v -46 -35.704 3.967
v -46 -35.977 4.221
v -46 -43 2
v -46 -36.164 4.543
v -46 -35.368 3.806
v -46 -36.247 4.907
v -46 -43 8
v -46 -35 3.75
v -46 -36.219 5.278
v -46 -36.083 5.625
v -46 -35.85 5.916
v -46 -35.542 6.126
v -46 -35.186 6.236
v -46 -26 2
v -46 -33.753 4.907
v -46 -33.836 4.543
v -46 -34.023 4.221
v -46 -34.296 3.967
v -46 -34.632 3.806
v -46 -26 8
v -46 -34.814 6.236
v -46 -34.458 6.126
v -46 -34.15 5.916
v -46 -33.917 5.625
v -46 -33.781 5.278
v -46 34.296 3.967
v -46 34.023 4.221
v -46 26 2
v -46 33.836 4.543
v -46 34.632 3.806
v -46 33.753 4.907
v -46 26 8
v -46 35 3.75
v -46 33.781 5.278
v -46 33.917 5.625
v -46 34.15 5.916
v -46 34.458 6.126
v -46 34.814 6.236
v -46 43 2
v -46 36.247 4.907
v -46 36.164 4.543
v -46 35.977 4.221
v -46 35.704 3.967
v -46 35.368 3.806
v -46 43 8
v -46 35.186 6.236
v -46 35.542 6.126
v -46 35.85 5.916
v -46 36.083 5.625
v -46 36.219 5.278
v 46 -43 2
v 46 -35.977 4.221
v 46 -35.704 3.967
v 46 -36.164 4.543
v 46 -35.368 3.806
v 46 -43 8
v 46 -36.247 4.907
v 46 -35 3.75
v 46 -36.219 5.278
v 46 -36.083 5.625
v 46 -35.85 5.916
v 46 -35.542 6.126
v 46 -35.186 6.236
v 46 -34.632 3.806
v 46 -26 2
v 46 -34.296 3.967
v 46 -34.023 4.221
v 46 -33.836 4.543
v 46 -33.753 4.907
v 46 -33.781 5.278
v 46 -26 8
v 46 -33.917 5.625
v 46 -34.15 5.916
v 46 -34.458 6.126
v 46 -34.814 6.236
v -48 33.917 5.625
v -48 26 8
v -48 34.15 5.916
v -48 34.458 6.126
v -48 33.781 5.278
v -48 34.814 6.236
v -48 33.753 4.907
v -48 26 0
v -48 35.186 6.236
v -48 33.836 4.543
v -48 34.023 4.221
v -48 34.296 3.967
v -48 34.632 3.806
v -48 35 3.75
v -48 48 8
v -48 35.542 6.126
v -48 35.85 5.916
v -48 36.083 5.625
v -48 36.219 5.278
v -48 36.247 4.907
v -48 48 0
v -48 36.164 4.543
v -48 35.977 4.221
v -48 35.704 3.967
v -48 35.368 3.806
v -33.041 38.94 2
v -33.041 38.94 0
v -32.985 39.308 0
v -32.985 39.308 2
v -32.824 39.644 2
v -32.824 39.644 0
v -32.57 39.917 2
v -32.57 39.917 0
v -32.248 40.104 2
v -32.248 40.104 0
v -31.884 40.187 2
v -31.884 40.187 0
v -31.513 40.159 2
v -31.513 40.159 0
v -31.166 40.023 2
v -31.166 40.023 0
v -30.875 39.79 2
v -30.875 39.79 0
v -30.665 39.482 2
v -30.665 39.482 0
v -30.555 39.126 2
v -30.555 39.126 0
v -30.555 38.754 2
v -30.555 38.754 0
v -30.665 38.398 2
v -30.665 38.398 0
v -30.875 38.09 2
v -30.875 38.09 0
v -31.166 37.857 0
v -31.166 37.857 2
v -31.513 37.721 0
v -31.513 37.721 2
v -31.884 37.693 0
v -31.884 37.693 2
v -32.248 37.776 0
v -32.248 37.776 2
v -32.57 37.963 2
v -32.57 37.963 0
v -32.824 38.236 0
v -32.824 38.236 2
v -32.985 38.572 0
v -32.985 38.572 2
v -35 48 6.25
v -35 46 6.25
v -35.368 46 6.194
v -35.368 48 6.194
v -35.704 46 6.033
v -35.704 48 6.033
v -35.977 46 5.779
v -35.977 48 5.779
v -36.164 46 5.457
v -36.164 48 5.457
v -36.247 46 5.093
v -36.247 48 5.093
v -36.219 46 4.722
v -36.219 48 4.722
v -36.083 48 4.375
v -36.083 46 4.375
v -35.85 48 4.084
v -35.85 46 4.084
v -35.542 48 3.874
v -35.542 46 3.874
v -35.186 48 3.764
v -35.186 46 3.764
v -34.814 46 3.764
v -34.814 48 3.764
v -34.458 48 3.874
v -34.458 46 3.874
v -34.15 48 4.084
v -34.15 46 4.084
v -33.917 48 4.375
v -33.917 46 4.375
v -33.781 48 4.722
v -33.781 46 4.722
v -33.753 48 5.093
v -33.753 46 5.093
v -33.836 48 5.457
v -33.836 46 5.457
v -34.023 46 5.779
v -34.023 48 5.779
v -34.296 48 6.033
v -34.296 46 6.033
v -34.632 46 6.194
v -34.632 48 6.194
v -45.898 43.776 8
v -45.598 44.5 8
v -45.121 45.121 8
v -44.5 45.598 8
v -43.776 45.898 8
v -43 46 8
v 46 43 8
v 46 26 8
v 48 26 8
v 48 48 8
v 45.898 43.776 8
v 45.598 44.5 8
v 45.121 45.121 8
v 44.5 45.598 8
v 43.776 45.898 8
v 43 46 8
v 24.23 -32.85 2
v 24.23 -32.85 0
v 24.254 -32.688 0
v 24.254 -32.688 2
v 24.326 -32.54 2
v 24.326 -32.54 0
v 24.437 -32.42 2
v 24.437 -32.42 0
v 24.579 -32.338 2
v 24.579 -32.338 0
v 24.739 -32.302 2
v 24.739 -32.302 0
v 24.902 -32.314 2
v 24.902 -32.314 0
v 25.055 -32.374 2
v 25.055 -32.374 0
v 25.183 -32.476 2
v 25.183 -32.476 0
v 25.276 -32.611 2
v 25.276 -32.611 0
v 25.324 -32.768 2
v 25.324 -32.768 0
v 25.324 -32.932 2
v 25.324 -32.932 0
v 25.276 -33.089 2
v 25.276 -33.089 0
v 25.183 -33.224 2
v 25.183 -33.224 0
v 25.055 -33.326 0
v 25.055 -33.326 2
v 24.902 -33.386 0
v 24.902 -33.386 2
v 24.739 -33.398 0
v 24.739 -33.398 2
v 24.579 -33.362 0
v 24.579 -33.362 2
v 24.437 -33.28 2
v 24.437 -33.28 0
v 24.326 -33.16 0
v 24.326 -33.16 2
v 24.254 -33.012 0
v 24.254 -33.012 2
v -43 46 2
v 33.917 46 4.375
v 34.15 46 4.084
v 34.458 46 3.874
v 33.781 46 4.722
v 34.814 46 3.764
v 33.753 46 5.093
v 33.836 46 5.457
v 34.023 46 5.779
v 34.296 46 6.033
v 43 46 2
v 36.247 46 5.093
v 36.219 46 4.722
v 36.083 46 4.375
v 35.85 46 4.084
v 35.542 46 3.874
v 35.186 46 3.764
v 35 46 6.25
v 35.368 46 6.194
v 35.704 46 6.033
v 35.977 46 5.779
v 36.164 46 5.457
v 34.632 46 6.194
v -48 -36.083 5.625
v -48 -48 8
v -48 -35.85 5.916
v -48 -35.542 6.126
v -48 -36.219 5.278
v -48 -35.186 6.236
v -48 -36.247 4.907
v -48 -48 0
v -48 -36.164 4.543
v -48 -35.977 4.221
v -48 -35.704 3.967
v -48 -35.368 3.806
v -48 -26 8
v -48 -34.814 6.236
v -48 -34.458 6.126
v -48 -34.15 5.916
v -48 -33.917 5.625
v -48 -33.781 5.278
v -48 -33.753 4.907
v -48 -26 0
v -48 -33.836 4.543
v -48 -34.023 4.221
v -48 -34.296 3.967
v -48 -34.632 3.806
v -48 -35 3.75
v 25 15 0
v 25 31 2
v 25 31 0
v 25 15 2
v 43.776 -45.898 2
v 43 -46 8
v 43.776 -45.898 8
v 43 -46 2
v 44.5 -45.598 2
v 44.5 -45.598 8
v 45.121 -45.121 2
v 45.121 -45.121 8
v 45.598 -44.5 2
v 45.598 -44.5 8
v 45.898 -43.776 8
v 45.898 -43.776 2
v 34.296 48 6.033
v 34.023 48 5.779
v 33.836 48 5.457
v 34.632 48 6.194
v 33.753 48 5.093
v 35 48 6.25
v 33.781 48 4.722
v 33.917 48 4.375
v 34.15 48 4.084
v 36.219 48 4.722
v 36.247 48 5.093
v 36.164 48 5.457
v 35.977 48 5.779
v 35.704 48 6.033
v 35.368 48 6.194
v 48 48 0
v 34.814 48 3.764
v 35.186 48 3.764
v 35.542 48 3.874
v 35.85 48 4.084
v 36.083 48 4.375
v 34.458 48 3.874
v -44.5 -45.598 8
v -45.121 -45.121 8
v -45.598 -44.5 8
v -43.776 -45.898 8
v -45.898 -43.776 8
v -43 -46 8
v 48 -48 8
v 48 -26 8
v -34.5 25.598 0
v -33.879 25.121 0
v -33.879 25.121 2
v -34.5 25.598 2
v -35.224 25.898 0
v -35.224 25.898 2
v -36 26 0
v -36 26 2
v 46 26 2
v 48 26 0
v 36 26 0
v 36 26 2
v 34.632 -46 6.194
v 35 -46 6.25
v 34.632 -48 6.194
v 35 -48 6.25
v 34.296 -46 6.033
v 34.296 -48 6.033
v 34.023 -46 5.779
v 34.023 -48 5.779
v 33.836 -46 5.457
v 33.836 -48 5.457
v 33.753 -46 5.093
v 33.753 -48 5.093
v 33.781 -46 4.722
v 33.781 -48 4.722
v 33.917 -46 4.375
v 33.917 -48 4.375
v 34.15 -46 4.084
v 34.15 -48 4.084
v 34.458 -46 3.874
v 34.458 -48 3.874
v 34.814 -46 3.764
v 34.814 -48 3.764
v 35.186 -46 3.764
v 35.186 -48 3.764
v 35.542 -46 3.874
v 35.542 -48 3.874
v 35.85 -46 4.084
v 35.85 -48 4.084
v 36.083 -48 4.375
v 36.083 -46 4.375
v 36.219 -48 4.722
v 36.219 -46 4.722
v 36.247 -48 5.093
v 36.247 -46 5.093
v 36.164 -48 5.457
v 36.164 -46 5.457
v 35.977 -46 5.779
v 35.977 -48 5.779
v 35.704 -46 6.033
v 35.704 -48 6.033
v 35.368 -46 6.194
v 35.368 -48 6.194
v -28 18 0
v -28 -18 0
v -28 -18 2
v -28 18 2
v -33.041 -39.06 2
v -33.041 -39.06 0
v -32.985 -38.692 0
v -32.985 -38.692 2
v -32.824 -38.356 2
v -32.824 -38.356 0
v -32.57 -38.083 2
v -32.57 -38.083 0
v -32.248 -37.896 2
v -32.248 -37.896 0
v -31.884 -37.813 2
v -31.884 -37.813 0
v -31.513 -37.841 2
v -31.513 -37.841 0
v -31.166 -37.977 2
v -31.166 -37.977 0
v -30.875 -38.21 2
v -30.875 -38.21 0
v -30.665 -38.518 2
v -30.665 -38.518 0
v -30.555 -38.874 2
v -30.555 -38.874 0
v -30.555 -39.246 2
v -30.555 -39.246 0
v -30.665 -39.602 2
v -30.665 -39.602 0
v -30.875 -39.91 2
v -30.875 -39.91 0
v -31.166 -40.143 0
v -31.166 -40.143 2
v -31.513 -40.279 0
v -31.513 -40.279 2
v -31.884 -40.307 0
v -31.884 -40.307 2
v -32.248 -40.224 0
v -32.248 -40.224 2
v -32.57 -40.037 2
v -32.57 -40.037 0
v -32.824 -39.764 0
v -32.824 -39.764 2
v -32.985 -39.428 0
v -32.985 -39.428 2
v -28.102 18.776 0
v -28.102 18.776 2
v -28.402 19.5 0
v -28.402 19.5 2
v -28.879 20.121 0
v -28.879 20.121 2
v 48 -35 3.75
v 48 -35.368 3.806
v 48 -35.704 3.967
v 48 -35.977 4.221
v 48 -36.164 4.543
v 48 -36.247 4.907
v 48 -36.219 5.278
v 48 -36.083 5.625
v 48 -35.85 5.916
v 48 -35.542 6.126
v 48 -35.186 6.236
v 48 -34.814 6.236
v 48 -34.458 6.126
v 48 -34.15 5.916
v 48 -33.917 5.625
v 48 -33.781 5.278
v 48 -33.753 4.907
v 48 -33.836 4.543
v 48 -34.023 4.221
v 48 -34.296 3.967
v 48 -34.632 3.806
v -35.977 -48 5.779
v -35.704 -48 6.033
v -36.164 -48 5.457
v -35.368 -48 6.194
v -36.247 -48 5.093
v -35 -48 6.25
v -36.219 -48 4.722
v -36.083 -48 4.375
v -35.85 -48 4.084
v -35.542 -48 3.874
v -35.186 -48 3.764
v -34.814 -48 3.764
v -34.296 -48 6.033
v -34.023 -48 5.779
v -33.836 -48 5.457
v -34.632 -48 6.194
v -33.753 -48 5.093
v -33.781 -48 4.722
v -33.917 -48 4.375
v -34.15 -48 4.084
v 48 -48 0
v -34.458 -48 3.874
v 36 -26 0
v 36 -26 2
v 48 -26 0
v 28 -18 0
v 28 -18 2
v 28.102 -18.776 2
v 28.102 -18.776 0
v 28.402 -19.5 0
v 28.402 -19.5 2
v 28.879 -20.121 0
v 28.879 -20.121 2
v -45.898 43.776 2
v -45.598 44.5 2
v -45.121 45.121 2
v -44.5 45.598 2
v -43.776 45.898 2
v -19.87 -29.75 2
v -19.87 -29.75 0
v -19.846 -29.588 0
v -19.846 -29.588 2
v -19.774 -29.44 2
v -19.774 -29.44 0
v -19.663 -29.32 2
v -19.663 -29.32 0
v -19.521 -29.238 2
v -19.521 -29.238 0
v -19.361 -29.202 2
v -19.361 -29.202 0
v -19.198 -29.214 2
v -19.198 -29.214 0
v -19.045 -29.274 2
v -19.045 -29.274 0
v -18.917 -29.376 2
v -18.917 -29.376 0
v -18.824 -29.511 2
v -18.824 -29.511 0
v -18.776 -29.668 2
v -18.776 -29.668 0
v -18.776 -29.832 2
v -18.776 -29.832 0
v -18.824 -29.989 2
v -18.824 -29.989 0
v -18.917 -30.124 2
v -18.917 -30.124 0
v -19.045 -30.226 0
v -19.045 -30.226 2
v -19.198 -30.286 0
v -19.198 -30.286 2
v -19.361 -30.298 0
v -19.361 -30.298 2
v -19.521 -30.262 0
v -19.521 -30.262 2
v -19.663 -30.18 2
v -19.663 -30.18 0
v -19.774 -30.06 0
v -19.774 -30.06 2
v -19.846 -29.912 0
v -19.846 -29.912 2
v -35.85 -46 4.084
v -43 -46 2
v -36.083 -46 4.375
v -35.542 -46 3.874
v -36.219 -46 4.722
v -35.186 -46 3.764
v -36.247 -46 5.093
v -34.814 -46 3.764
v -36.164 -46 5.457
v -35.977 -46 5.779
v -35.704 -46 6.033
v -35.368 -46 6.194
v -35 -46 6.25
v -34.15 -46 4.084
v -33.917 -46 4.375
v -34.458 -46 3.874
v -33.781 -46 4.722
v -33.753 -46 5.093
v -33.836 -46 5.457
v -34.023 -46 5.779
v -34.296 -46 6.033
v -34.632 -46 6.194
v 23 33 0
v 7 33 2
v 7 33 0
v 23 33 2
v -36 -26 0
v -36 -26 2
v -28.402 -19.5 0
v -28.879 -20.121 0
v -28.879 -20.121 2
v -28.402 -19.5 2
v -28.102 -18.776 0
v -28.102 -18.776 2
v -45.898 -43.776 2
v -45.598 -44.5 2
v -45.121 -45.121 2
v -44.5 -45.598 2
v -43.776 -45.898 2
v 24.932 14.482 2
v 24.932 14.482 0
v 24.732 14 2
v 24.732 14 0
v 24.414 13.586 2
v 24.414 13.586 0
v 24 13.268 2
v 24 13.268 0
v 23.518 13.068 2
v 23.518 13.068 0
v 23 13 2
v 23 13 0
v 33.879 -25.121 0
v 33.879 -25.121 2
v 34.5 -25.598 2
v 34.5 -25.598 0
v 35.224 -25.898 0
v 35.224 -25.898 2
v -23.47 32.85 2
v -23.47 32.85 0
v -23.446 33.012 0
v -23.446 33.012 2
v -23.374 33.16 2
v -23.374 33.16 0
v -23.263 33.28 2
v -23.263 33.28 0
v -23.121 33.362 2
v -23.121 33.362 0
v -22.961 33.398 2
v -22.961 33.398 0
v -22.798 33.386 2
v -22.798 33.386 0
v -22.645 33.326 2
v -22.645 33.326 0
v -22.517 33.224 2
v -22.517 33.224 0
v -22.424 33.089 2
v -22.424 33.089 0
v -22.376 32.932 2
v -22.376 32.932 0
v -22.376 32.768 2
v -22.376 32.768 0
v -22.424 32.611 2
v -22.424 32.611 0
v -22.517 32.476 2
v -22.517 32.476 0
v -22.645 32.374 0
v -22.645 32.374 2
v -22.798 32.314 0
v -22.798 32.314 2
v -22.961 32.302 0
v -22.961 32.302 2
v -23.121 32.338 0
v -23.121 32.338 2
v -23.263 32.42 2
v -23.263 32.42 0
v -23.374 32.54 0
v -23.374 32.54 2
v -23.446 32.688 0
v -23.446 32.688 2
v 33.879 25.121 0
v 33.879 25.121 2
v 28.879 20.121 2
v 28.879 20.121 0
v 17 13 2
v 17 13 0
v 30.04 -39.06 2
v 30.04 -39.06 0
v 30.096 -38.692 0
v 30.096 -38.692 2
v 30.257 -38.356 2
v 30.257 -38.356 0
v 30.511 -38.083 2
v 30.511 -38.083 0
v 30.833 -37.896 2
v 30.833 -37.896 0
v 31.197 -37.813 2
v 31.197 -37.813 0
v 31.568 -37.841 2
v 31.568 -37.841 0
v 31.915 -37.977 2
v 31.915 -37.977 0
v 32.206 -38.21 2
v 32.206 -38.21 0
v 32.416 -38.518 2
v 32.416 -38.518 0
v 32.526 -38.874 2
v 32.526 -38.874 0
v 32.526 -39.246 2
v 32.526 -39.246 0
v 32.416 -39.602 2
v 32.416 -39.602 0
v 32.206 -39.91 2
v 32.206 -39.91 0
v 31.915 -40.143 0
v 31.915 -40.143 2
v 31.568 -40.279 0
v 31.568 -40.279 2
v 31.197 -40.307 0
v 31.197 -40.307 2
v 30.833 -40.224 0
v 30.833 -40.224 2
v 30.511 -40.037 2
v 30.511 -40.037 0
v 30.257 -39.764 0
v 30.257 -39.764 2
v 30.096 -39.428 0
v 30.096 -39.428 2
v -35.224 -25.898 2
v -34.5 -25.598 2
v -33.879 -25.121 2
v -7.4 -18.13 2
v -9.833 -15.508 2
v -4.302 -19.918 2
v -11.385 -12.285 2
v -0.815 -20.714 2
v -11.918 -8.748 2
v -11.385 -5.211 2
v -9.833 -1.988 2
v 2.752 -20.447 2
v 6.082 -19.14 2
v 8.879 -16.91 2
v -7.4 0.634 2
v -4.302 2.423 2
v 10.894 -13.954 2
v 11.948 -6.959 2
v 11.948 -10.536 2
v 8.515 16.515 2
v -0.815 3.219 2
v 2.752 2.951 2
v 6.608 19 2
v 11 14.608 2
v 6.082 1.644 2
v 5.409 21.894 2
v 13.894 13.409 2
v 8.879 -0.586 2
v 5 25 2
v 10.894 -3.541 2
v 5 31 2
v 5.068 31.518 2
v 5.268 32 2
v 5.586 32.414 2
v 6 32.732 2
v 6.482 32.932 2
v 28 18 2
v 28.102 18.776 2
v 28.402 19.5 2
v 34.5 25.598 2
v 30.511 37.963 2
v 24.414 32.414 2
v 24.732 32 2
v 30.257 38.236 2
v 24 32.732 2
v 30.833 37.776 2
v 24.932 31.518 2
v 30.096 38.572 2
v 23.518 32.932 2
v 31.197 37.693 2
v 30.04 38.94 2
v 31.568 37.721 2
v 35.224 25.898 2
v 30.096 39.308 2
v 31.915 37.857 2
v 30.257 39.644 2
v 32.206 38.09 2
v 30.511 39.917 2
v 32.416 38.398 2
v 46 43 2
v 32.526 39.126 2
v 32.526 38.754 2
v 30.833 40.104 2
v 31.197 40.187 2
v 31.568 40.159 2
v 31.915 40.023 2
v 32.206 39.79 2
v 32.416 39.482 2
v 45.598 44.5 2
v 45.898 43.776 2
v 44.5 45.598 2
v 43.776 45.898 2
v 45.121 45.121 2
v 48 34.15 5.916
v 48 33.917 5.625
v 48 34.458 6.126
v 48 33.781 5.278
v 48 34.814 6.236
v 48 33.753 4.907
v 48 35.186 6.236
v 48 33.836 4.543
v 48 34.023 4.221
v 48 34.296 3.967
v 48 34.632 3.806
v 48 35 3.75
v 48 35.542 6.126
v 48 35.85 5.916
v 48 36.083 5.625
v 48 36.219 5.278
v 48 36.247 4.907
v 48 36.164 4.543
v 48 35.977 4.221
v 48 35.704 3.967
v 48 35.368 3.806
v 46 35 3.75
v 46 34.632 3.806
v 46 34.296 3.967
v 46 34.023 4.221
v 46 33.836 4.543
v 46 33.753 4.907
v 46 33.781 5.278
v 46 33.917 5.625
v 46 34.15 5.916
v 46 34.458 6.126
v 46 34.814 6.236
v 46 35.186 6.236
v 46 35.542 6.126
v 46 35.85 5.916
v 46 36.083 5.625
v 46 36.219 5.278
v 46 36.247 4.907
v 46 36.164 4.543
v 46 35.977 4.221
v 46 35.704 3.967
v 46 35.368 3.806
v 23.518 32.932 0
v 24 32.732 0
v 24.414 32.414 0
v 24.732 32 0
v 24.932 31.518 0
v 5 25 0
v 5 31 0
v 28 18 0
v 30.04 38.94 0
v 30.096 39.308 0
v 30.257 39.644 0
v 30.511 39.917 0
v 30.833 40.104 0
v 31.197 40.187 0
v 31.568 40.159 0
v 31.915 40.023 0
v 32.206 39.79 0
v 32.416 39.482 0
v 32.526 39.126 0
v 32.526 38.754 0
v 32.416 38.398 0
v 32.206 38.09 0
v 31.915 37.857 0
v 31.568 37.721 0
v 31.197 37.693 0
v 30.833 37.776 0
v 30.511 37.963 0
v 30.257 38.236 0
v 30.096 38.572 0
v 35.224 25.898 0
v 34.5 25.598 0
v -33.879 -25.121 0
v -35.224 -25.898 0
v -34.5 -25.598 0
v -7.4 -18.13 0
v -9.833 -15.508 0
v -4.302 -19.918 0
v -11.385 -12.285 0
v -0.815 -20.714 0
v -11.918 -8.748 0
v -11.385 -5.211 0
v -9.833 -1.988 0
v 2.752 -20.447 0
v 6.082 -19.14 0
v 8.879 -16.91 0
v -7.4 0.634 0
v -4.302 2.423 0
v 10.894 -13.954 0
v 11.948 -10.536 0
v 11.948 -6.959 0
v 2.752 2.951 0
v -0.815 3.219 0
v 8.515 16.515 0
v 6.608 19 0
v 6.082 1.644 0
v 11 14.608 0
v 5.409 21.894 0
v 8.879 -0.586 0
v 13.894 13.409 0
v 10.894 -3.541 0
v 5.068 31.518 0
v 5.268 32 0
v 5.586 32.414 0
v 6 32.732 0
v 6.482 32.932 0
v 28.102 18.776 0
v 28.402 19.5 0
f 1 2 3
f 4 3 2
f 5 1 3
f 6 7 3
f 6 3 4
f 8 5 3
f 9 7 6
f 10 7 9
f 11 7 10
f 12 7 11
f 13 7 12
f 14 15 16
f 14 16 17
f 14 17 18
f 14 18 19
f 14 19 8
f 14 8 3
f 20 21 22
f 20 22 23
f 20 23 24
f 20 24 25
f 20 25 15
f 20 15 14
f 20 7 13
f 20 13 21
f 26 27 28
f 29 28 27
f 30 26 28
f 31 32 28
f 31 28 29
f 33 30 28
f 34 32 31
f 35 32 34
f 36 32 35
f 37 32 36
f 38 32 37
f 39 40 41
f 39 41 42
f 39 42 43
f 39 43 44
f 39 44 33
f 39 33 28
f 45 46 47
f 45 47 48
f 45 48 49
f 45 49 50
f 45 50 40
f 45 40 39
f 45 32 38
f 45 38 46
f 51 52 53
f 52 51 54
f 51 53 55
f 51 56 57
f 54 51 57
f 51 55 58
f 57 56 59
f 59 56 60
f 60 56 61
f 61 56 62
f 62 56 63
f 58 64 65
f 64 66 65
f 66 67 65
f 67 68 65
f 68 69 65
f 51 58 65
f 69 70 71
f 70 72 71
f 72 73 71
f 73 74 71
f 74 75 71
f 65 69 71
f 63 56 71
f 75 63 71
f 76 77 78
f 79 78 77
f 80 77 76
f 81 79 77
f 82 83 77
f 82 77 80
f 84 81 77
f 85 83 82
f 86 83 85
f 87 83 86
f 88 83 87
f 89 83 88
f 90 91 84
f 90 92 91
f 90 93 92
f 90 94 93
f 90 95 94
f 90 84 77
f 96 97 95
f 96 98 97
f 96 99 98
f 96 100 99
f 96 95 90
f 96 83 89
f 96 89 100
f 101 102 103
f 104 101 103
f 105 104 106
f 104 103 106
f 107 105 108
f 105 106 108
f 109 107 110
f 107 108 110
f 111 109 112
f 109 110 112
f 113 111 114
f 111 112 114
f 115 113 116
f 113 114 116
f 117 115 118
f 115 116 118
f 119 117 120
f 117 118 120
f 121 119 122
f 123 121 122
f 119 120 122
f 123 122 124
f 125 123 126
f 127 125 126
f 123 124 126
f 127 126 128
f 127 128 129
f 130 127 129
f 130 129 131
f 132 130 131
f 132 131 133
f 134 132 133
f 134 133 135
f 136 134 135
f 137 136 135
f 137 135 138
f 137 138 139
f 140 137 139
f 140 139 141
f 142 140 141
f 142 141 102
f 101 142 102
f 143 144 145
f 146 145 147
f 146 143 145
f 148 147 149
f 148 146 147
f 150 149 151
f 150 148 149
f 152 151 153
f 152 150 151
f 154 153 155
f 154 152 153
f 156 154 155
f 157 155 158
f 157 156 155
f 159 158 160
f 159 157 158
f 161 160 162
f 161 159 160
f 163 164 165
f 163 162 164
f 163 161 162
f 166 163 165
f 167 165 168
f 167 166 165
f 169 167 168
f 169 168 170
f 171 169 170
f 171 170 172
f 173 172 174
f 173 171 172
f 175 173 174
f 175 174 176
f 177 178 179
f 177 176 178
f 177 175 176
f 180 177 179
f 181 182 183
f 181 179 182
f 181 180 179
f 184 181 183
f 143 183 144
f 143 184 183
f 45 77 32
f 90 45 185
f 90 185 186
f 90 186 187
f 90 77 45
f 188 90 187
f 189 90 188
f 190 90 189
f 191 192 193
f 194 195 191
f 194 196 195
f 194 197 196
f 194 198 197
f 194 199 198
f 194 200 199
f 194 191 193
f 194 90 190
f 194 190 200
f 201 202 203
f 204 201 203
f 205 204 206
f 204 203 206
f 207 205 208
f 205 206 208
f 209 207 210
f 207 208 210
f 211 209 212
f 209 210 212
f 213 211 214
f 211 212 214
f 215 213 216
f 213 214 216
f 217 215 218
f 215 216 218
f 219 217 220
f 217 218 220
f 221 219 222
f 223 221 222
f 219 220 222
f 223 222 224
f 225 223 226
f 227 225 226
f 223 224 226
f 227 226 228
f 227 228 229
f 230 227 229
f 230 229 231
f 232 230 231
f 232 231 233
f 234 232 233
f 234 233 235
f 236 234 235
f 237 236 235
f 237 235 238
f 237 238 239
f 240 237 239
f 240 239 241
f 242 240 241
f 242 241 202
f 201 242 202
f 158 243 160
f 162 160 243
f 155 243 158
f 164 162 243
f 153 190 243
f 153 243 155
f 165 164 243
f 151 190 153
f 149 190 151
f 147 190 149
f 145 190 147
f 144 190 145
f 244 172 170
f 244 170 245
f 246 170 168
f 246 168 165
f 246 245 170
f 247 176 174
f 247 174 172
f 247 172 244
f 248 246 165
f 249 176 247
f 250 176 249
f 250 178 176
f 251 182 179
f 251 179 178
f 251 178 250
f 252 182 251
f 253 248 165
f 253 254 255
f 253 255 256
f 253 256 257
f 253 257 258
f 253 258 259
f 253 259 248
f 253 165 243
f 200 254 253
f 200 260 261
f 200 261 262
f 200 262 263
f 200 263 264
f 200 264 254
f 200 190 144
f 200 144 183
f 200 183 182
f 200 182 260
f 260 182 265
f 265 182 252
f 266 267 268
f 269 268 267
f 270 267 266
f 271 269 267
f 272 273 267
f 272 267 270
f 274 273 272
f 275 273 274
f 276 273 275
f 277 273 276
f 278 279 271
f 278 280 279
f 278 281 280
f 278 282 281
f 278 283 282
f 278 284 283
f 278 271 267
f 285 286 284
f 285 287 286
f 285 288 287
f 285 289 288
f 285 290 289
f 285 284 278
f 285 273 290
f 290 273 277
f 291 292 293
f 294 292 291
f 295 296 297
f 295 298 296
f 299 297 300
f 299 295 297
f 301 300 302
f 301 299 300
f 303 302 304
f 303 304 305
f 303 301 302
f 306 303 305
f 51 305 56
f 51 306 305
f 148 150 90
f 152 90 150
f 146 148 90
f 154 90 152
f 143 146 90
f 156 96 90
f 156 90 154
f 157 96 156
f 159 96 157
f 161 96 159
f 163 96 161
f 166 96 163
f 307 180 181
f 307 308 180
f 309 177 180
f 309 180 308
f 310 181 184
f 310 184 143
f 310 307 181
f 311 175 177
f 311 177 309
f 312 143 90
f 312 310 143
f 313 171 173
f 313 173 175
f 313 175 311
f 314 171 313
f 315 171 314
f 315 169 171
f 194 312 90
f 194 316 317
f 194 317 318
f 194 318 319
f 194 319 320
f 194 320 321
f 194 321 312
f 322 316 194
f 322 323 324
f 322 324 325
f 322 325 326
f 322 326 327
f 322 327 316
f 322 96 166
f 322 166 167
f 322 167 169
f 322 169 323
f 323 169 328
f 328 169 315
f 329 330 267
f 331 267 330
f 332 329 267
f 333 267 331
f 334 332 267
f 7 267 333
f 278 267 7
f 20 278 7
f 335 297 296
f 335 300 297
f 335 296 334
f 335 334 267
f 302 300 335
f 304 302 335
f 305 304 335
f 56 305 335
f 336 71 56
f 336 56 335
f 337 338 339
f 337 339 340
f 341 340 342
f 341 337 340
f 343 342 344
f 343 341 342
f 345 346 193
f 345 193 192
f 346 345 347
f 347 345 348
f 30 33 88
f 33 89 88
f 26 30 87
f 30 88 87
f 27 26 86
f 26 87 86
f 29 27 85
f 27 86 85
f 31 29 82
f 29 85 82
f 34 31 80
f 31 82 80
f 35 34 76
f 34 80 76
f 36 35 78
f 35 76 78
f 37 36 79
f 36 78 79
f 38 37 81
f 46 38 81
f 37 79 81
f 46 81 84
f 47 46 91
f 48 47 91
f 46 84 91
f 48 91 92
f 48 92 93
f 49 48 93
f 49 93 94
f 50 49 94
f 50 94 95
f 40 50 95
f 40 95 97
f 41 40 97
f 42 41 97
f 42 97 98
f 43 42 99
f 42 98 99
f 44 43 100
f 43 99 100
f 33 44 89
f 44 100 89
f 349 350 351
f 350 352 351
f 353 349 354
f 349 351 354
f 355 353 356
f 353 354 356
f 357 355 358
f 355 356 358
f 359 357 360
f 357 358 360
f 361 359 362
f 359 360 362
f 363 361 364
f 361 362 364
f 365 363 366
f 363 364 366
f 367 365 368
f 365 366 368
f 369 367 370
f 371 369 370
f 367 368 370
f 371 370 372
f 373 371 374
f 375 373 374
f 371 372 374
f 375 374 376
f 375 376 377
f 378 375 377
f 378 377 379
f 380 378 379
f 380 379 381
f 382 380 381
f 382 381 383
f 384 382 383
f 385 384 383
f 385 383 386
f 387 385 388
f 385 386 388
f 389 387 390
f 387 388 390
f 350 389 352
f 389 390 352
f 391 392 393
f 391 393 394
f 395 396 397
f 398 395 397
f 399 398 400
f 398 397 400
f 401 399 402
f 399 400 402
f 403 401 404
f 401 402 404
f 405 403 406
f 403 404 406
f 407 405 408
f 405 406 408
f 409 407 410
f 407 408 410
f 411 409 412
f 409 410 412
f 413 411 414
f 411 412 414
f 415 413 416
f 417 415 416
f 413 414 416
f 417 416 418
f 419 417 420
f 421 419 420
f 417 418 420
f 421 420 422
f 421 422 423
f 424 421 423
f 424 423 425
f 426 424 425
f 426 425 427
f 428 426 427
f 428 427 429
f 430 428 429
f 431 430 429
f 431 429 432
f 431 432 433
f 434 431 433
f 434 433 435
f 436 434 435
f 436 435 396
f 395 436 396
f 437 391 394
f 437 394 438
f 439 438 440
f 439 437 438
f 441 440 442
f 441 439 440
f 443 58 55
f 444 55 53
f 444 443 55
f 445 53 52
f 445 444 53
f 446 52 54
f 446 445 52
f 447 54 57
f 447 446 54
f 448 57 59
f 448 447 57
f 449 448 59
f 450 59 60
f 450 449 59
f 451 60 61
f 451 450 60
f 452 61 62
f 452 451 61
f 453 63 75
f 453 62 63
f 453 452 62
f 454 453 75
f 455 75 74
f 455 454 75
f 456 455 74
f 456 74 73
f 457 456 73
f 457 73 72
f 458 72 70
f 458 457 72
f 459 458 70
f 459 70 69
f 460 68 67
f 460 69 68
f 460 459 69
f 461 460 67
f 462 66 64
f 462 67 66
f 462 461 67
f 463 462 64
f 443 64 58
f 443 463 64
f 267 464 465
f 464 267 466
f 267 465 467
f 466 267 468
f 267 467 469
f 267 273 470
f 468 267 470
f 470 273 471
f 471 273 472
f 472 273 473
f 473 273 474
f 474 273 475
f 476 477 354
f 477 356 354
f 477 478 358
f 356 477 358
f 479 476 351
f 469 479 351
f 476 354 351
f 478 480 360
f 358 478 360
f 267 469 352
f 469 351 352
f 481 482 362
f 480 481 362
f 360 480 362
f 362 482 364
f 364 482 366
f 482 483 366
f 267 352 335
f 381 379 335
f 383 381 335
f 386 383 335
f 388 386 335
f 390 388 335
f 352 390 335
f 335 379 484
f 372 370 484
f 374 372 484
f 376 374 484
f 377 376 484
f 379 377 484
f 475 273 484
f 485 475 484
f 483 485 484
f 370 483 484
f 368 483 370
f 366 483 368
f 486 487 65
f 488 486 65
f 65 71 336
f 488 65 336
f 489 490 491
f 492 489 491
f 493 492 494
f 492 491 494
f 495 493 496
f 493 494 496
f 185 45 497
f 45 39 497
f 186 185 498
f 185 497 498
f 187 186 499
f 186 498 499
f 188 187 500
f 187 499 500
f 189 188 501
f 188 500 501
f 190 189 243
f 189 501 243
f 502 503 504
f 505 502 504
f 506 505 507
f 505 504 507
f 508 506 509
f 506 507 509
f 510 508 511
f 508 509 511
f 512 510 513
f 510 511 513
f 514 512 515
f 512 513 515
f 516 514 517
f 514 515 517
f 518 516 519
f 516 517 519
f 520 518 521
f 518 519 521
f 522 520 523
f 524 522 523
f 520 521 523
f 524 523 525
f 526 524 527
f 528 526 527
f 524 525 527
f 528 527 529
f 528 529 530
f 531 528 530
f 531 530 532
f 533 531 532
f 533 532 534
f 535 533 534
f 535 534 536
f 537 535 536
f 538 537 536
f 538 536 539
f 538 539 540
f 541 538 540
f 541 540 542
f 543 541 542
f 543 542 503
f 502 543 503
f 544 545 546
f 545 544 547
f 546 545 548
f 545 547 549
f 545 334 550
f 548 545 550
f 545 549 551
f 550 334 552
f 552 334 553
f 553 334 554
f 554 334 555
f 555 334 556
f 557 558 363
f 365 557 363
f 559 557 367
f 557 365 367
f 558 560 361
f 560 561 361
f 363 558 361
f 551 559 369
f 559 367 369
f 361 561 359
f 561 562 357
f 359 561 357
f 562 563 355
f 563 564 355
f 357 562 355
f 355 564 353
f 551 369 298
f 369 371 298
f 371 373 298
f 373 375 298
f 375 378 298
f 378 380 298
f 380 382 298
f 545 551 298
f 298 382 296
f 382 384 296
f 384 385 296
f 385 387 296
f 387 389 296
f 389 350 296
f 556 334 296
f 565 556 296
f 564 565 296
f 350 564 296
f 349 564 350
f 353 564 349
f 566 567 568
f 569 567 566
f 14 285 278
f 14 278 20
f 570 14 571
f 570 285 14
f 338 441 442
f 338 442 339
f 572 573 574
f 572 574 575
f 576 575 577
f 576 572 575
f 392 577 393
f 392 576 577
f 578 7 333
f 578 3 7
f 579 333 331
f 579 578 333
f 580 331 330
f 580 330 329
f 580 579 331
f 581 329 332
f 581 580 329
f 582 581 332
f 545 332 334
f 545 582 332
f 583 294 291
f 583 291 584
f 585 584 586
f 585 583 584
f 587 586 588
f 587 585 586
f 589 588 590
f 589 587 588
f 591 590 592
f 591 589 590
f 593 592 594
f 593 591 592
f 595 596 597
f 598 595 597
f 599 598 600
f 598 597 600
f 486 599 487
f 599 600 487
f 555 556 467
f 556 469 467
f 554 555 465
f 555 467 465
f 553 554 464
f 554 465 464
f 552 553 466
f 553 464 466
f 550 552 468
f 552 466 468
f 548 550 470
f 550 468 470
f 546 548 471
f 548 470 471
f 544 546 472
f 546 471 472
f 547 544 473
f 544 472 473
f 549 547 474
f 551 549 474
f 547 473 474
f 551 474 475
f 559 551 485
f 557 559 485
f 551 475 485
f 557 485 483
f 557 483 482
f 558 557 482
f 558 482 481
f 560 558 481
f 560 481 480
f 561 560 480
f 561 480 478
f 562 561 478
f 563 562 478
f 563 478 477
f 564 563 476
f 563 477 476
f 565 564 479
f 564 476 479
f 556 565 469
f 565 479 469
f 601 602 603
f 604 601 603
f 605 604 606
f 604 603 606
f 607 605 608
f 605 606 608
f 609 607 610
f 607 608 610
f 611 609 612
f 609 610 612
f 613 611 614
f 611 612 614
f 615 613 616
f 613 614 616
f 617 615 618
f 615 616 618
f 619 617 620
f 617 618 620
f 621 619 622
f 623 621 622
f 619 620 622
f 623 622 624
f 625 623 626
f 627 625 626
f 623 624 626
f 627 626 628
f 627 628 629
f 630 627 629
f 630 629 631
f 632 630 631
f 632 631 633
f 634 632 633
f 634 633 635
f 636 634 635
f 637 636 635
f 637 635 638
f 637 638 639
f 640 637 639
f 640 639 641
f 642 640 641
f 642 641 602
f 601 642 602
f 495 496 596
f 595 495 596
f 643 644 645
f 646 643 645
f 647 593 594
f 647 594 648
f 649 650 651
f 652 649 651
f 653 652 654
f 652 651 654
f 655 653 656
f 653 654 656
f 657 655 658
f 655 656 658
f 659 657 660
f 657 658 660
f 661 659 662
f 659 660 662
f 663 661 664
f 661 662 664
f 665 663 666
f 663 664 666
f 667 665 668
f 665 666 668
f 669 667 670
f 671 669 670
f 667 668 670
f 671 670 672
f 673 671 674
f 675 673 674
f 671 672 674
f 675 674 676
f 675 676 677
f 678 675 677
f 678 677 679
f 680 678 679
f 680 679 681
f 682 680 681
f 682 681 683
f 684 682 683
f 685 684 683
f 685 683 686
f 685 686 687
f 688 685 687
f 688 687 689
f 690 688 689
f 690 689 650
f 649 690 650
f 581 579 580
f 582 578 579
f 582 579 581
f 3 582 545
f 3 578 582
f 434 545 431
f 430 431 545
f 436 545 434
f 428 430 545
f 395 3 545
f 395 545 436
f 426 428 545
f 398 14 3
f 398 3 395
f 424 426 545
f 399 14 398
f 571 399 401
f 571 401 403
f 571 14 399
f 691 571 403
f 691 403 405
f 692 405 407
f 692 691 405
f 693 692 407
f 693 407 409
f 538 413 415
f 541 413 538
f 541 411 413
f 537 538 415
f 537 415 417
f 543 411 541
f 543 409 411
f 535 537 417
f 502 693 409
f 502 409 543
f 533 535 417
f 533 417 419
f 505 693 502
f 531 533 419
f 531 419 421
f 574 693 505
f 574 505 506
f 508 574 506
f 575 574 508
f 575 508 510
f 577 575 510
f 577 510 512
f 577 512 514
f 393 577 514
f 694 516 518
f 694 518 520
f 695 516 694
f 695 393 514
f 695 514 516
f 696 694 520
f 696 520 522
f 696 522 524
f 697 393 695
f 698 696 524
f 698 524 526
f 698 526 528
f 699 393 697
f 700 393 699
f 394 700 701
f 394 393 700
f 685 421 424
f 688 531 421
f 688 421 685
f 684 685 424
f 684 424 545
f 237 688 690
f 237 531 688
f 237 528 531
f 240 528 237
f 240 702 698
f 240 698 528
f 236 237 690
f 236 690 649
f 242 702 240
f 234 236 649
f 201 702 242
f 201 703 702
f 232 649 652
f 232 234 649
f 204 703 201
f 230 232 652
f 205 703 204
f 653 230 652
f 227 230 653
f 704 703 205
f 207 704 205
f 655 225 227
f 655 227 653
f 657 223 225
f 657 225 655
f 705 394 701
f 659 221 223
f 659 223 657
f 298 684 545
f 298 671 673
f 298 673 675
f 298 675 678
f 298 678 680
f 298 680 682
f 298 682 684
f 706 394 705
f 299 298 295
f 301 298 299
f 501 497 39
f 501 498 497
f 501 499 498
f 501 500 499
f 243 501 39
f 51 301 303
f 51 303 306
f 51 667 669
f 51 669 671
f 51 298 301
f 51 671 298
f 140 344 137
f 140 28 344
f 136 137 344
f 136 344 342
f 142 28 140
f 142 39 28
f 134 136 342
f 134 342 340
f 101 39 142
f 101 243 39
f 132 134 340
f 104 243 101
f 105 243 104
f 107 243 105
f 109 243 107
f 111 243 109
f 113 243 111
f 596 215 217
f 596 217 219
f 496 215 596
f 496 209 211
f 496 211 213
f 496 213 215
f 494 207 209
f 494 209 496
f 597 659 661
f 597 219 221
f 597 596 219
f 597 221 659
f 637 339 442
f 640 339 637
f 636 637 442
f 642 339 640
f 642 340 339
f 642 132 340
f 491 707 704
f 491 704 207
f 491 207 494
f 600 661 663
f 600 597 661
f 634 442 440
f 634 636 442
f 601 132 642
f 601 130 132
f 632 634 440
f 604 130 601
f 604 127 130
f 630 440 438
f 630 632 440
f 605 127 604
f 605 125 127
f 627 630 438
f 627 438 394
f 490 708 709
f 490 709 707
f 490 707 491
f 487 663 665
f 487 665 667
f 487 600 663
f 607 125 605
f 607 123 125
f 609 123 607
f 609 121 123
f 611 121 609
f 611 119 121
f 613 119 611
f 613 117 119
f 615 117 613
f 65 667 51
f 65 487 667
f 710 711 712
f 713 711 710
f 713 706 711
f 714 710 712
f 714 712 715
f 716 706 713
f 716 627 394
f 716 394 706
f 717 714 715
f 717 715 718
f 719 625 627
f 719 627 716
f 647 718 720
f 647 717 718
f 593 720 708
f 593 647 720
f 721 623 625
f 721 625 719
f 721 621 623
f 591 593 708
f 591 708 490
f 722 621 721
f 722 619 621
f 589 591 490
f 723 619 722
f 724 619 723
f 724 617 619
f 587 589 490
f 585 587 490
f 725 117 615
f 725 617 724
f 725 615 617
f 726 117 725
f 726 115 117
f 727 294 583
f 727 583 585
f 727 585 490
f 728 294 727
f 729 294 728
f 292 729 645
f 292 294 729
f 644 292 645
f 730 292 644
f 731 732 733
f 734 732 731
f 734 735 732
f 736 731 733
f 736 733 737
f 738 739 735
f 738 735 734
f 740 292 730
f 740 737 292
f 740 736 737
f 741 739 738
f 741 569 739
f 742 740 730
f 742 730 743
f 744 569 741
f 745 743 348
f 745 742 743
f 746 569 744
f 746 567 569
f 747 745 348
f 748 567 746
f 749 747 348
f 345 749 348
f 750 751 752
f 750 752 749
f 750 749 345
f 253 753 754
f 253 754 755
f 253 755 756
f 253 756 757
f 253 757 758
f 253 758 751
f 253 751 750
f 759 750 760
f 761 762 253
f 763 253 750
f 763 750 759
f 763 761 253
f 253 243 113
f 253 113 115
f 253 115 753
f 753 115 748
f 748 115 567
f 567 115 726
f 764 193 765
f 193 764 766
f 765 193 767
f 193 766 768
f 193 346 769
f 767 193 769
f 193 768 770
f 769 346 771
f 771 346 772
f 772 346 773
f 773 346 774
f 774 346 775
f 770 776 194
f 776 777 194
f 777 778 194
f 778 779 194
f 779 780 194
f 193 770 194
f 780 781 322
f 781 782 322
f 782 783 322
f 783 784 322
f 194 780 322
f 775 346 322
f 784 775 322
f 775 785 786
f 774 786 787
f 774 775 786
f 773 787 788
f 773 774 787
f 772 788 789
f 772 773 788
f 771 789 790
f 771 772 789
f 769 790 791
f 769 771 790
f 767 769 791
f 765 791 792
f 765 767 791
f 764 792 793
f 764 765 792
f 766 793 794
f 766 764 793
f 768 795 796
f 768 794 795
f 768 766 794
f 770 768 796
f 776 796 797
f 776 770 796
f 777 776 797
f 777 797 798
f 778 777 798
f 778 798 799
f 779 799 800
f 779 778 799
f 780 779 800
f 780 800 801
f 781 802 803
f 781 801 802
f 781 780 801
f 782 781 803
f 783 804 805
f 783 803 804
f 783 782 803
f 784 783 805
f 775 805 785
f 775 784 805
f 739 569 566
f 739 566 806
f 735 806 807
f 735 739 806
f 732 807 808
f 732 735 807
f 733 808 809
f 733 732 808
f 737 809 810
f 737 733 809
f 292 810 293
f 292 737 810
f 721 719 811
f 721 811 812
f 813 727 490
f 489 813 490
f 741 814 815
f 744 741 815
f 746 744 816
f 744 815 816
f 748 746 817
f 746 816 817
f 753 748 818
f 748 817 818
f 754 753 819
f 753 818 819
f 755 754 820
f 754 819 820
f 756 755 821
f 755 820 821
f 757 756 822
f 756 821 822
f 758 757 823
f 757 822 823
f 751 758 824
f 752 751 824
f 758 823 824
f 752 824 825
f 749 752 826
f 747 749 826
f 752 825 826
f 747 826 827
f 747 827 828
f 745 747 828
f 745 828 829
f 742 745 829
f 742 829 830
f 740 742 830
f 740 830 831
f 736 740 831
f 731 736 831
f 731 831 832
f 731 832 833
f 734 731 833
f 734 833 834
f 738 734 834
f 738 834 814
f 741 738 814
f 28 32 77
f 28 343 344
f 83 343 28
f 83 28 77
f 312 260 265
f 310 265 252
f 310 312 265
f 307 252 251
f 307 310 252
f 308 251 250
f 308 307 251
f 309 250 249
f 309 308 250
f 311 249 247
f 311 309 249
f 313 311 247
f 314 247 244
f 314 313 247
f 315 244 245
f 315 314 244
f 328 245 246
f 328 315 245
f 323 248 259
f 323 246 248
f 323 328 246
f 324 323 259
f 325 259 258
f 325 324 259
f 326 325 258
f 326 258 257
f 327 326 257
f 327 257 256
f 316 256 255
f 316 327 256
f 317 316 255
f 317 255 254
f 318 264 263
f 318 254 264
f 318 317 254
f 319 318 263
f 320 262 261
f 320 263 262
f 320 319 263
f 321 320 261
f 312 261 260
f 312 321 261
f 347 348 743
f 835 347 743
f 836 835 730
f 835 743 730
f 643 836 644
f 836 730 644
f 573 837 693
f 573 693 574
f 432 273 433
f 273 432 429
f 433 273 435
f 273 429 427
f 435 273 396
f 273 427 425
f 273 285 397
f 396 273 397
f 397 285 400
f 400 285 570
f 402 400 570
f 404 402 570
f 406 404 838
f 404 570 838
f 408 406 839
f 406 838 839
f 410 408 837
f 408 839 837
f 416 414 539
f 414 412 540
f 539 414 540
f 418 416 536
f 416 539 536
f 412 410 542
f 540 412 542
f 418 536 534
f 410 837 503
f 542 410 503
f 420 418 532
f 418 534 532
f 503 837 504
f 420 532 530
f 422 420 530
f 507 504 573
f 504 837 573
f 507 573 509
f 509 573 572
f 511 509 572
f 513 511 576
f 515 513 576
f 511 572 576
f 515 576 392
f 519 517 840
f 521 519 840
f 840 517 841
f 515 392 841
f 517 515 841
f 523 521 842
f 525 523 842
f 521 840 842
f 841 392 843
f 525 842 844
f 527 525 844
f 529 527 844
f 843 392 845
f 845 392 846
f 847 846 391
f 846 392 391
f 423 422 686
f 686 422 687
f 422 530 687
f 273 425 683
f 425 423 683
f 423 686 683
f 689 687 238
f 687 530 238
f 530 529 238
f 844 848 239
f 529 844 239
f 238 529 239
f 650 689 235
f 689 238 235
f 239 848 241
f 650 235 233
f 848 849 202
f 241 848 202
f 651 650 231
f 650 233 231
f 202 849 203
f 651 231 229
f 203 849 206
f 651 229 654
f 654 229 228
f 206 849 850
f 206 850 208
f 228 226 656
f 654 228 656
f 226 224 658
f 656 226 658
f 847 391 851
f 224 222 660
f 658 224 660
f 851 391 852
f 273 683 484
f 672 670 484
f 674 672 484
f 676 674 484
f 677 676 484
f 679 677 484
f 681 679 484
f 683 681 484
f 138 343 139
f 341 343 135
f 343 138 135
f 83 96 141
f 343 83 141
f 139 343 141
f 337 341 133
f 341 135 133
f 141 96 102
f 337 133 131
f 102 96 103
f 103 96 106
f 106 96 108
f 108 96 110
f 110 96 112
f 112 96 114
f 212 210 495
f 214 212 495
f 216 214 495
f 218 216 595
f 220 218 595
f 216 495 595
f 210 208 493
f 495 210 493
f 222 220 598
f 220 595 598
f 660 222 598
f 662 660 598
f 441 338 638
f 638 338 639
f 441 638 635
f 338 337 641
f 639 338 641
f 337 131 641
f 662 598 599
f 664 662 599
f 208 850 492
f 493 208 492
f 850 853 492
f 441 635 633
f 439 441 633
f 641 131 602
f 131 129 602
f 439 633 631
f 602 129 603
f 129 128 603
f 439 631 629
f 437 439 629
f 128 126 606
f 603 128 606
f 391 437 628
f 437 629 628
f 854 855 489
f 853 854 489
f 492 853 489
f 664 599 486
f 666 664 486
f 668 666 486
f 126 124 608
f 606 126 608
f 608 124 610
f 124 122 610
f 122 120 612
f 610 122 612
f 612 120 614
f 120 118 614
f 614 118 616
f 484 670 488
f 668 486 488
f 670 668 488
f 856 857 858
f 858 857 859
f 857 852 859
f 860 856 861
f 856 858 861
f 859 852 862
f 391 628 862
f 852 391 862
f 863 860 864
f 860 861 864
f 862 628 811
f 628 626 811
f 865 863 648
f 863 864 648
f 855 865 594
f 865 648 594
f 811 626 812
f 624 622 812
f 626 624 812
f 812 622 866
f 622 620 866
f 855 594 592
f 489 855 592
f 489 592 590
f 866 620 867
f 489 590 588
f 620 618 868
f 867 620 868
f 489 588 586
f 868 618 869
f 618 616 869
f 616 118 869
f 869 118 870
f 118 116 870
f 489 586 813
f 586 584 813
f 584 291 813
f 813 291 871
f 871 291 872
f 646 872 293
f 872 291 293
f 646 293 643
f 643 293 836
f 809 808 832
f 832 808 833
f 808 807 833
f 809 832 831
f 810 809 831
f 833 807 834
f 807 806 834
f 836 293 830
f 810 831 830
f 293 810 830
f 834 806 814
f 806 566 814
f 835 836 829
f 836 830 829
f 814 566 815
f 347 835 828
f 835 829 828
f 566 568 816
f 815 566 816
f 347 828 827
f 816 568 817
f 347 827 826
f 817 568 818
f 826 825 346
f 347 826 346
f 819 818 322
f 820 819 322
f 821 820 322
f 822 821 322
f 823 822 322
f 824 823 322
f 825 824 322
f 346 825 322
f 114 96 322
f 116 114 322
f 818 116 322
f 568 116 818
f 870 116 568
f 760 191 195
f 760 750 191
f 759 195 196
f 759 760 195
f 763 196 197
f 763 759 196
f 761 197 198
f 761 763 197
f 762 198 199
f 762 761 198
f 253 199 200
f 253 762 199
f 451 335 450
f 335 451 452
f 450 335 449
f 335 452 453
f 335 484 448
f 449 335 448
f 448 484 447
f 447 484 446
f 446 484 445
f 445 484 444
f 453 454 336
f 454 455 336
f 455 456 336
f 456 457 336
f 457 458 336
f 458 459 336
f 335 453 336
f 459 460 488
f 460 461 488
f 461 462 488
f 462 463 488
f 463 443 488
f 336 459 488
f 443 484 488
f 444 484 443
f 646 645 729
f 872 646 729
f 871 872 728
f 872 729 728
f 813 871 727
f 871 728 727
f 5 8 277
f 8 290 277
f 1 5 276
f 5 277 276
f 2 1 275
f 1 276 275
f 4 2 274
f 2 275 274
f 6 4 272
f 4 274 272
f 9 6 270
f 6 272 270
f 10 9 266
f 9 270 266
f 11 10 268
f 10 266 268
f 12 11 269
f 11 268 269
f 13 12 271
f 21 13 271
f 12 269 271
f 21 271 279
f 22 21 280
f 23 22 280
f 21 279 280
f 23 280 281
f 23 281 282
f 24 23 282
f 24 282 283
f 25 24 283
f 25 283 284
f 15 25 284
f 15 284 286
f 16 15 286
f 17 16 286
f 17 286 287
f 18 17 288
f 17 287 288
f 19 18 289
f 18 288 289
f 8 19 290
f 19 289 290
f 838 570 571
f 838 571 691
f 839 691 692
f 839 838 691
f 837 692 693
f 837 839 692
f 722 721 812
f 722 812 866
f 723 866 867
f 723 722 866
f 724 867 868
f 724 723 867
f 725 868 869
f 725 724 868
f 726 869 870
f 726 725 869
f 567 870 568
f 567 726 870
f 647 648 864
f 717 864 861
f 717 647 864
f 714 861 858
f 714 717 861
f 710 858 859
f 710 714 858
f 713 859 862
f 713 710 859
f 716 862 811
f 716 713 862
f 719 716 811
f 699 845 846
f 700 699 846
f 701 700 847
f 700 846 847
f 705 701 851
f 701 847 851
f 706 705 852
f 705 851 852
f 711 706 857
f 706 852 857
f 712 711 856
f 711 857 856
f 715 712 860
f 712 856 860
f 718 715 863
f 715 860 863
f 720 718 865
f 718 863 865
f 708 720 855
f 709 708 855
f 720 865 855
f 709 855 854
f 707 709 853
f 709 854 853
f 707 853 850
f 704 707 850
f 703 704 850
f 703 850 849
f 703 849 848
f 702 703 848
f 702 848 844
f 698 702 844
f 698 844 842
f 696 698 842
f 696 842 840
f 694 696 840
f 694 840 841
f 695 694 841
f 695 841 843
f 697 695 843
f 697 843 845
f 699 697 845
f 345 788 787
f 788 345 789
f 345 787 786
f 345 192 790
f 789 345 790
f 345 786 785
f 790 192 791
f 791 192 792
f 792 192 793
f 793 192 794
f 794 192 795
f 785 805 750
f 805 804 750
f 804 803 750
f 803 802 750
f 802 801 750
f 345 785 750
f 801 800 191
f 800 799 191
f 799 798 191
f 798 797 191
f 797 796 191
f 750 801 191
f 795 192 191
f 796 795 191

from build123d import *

# Parameters (mm, degrees)
SKETCH1_W                      = 96
SKETCH1_H                      = 96
BOSS_EXTRUDE1_DEPTH            = 8
SKETCH2_W                      = 92
SKETCH2_H                      = 92
COMPONENT_PLATFORM_DEPTH       = 6
CABLE_SLOTS_DEPTH              = 6
INNER_CORNER_FILLETS_R         = 3
M3X0_5_TAPPED_HOLE1_AT_2_COUNT = 2
M3X0_5_TAPPED_HOLE1_AT_2_PITCH = 70
M3X0_5_TAPPED_HOLE2_AT_2_COUNT = 2
M3X0_5_TAPPED_HOLE2_AT_2_PITCH = 70
M1_4X0_3_TAPPED_HOLE1_D        = 1.1
M1_4X0_3_TAPPED_HOLE1_DEPTH    = 3.7
M1_4X0_3_TAPPED_HOLE1_TIP      = 0.33047334
SKETCH29_R                     = 12
HDD_EXTRUSION_CUTOUT_DEPTH     = 10
HDD_EXTRUSION_CUTOUT_2_DEPTH   = 10
M3X0_5_TAPPED_HOLE3_D          = 2.5
M3X0_5_TAPPED_HOLE3_DEPTH      = 10
M3X0_5_TAPPED_HOLE3_TIP        = 0.751075774


with BuildPart() as part:
    # Sketch1 → Boss-Extrude1 (new body)
    with BuildSketch(Plane.XY):
        Rectangle(SKETCH1_W, SKETCH1_H)
    extrude(amount=BOSS_EXTRUDE1_DEPTH)

    # Sketch2 → Component Platform (cut)
    with BuildSketch(Plane.XY.offset(8)):
        Rectangle(SKETCH2_W, SKETCH2_H)
    extrude(amount=-COMPONENT_PLATFORM_DEPTH, mode=Mode.SUBTRACT)

    # Sketch3 → Cable Slots (cut, symmetric)
    with BuildSketch(Plane.XY.offset(2)):
        with BuildLine():
            Line((-33.878679656, -25.121320344), (-28.878679656, -20.121320344))
            ThreePointArc((-28.878679656, -20.121320344), (-28.228361402, -19.148050297), (-28, -18))
            Line((-28, -18), (-28, 18))
            ThreePointArc((-28, 18), (-28.228361402, 19.148050297), (-28.878679656, 20.121320344))
            Line((-28.878679656, 20.121320344), (-33.878679656, 25.121320344))
            ThreePointArc((-33.878679656, 25.121320344), (-34.851949703, 25.771638598), (-36, 26))
            Line((-36, 26), (-48, 26))
            Line((-48, 26), (-48, -26))
            Line((-48, -26), (-36, -26))
            ThreePointArc((-36, -26), (-34.851949703, -25.771638598), (-33.878679656, -25.121320344))
        make_face()
        with BuildLine():
            Line((48, -26), (48, 26))
            Line((48, 26), (36, 26))
            ThreePointArc((36, 26), (34.851949703, 25.771638598), (33.878679656, 25.121320344))
            Line((33.878679656, 25.121320344), (28.878679656, 20.121320344))
            ThreePointArc((28.878679656, 20.121320344), (28.228361402, 19.148050297), (28, 18))
            Line((28, 18), (28, -18))
            ThreePointArc((28, -18), (28.228361402, -19.148050297), (28.878679656, -20.121320344))
            Line((28.878679656, -20.121320344), (33.878679656, -25.121320344))
            ThreePointArc((33.878679656, -25.121320344), (34.851949703, -25.771638598), (36, -26))
            Line((36, -26), (48, -26))
        make_face()
    extrude(amount=CABLE_SLOTS_DEPTH, both=True, mode=Mode.SUBTRACT)

    # Inner Corner Fillets
    inner_corner_fillets_edges = [part.edges().sort_by_distance(p)[0] for p in [
        (-46, -46, 5),
        (-46, 46, 5),
        (46, 46, 5),
        (46, -46, 5),
    ]]
    fillet(inner_corner_fillets_edges, radius=INNER_CORNER_FILLETS_R)

    # Sketch14 → M3x0.5 Tapped Hole1 (revolve, cut)
    with BuildSketch(Plane(origin=(48, -35, 5), x_dir=(0, 0, -1), z_dir=(0, 1, 0))):
        Polygon((0, 0), (0, 10.751075774), (1.25, 10), (1.25, 0), align=None)
    m3x0_5_tapped_hole1 = revolve(axis=Axis((54.35, -35, 5), (-1, 0, 0)), mode=Mode.SUBTRACT)

    # M3x0.5 Tapped Hole1 at 2: M3x0.5 Tapped Hole1 ×2
    with Locations(*[(0, i * M3X0_5_TAPPED_HOLE1_AT_2_PITCH, 0) for i in range(1, M3X0_5_TAPPED_HOLE1_AT_2_COUNT)]):
        add(m3x0_5_tapped_hole1, mode=Mode.SUBTRACT)

    # Sketch16 → M3x0.5 Tapped Hole2 (revolve, cut)
    with BuildSketch(Plane(origin=(35, 48, 5), x_dir=(0, 0, 1), z_dir=(1, 0, 0))):
        Polygon((0, 0), (0, 10.751075774), (1.25, 10), (1.25, 0), align=None)
    m3x0_5_tapped_hole2 = revolve(axis=Axis((35, 54.35, 5), (0, -1, 0)), mode=Mode.SUBTRACT)

    # M3x0.5 Tapped Hole2 at 2: M3x0.5 Tapped Hole2 ×2
    with Locations(*[(-i * M3X0_5_TAPPED_HOLE2_AT_2_PITCH, 0, 0) for i in range(1, M3X0_5_TAPPED_HOLE2_AT_2_COUNT)]):
        add(m3x0_5_tapped_hole2, mode=Mode.SUBTRACT)

    # Mirror1: M3x0.5 Tapped Hole1 across plane
    add(m3x0_5_tapped_hole1.mirror(Plane(origin=(0, 0, 0), x_dir=(0, 0, 1), z_dir=(1, 0, 0))), mode=Mode.SUBTRACT)

    # Mirror1 copy 1 sketch → Mirror1 copy 1 (revolve, cut)
    with BuildSketch(Plane(origin=(-48, 35, 5), x_dir=(0, 0, -1), z_dir=(0, 1, 0))):
        Polygon((0, 0), (0, -10.751075774), (1.25, -10), (1.25, 0), align=None)
    revolve(axis=Axis((-54.35, 35, 5), (-1, 0, 0)), mode=Mode.SUBTRACT)

    # Mirror2: M3x0.5 Tapped Hole2 across plane
    add(m3x0_5_tapped_hole2.mirror(Plane(origin=(0, 0, 0), x_dir=(0, 0, 1), z_dir=(0, -1, 0))), mode=Mode.SUBTRACT)

    # Mirror2 copy 1 sketch → Mirror2 copy 1 (revolve, cut)
    with BuildSketch(Plane(origin=(-35, -48, 5), x_dir=(0, 0, 1), z_dir=(1, 0, 0))):
        Polygon((0, 0), (0, -10.751075774), (1.25, -10), (1.25, 0), align=None)
    revolve(axis=Axis((-35, -54.35, 5), (0, -1, 0)), mode=Mode.SUBTRACT)

    # M1.4x0.3 Tapped Hole1
    with Locations(Plane.XY.offset(2)):
        with Locations((-19.31998517, -29.75), (24.78001483, -32.85), (-22.91998517, 32.85)):
            Hole(M1_4X0_3_TAPPED_HOLE1_D / 2, depth=M1_4X0_3_TAPPED_HOLE1_DEPTH)
            with Locations((0, 0, -(M1_4X0_3_TAPPED_HOLE1_DEPTH + M1_4X0_3_TAPPED_HOLE1_TIP / 2))):  # 118° drill point
                Cone(0, M1_4X0_3_TAPPED_HOLE1_D / 2, M1_4X0_3_TAPPED_HOLE1_TIP, mode=Mode.SUBTRACT)

    # Sketch29 → HDD Extrusion Cutout (cut)
    with BuildSketch(Plane(origin=(0, 0, 0), x_dir=(-1, 0, 0), z_dir=(0, 0, -1))):
        with Locations((-0.08192631, -8.74785827)):
            Circle(SKETCH29_R)
    extrude(amount=-HDD_EXTRUSION_CUTOUT_DEPTH, mode=Mode.SUBTRACT)

    # Sketch9 → HDD Extrusion Cutout 2 (cut)
    with BuildSketch(Plane.XY.offset(2)):
        with BuildLine():
            Line((25, 31), (25, 15))
            ThreePointArc((25, 15), (24.414213562, 13.585786438), (23, 13))
            Line((23, 13), (17, 13))
            ThreePointArc((17, 13), (8.514718626, 16.514718626), (5, 25))
            Line((5, 25), (5, 31))
            ThreePointArc((5, 31), (5.585786438, 32.414213562), (7, 33))
            Line((7, 33), (23, 33))
            ThreePointArc((23, 33), (24.414213562, 32.414213562), (25, 31))
        make_face()
    extrude(amount=-HDD_EXTRUSION_CUTOUT_2_DEPTH, mode=Mode.SUBTRACT)

    # M3x0.5 Tapped Hole3
    with Locations(Plane.XY.offset(2)):
        with Locations((-31.790998517, -39.06), (31.29001483, -39.06), (31.29001483, 38.94), (-31.790998517, 38.94)):
            Hole(M3X0_5_TAPPED_HOLE3_D / 2, depth=M3X0_5_TAPPED_HOLE3_DEPTH)
            with Locations((0, 0, -(M3X0_5_TAPPED_HOLE3_DEPTH + M3X0_5_TAPPED_HOLE3_TIP / 2))):  # 118° drill point
                Cone(0, M3X0_5_TAPPED_HOLE3_D / 2, M3X0_5_TAPPED_HOLE3_TIP, mode=Mode.SUBTRACT)


solid = part.part
